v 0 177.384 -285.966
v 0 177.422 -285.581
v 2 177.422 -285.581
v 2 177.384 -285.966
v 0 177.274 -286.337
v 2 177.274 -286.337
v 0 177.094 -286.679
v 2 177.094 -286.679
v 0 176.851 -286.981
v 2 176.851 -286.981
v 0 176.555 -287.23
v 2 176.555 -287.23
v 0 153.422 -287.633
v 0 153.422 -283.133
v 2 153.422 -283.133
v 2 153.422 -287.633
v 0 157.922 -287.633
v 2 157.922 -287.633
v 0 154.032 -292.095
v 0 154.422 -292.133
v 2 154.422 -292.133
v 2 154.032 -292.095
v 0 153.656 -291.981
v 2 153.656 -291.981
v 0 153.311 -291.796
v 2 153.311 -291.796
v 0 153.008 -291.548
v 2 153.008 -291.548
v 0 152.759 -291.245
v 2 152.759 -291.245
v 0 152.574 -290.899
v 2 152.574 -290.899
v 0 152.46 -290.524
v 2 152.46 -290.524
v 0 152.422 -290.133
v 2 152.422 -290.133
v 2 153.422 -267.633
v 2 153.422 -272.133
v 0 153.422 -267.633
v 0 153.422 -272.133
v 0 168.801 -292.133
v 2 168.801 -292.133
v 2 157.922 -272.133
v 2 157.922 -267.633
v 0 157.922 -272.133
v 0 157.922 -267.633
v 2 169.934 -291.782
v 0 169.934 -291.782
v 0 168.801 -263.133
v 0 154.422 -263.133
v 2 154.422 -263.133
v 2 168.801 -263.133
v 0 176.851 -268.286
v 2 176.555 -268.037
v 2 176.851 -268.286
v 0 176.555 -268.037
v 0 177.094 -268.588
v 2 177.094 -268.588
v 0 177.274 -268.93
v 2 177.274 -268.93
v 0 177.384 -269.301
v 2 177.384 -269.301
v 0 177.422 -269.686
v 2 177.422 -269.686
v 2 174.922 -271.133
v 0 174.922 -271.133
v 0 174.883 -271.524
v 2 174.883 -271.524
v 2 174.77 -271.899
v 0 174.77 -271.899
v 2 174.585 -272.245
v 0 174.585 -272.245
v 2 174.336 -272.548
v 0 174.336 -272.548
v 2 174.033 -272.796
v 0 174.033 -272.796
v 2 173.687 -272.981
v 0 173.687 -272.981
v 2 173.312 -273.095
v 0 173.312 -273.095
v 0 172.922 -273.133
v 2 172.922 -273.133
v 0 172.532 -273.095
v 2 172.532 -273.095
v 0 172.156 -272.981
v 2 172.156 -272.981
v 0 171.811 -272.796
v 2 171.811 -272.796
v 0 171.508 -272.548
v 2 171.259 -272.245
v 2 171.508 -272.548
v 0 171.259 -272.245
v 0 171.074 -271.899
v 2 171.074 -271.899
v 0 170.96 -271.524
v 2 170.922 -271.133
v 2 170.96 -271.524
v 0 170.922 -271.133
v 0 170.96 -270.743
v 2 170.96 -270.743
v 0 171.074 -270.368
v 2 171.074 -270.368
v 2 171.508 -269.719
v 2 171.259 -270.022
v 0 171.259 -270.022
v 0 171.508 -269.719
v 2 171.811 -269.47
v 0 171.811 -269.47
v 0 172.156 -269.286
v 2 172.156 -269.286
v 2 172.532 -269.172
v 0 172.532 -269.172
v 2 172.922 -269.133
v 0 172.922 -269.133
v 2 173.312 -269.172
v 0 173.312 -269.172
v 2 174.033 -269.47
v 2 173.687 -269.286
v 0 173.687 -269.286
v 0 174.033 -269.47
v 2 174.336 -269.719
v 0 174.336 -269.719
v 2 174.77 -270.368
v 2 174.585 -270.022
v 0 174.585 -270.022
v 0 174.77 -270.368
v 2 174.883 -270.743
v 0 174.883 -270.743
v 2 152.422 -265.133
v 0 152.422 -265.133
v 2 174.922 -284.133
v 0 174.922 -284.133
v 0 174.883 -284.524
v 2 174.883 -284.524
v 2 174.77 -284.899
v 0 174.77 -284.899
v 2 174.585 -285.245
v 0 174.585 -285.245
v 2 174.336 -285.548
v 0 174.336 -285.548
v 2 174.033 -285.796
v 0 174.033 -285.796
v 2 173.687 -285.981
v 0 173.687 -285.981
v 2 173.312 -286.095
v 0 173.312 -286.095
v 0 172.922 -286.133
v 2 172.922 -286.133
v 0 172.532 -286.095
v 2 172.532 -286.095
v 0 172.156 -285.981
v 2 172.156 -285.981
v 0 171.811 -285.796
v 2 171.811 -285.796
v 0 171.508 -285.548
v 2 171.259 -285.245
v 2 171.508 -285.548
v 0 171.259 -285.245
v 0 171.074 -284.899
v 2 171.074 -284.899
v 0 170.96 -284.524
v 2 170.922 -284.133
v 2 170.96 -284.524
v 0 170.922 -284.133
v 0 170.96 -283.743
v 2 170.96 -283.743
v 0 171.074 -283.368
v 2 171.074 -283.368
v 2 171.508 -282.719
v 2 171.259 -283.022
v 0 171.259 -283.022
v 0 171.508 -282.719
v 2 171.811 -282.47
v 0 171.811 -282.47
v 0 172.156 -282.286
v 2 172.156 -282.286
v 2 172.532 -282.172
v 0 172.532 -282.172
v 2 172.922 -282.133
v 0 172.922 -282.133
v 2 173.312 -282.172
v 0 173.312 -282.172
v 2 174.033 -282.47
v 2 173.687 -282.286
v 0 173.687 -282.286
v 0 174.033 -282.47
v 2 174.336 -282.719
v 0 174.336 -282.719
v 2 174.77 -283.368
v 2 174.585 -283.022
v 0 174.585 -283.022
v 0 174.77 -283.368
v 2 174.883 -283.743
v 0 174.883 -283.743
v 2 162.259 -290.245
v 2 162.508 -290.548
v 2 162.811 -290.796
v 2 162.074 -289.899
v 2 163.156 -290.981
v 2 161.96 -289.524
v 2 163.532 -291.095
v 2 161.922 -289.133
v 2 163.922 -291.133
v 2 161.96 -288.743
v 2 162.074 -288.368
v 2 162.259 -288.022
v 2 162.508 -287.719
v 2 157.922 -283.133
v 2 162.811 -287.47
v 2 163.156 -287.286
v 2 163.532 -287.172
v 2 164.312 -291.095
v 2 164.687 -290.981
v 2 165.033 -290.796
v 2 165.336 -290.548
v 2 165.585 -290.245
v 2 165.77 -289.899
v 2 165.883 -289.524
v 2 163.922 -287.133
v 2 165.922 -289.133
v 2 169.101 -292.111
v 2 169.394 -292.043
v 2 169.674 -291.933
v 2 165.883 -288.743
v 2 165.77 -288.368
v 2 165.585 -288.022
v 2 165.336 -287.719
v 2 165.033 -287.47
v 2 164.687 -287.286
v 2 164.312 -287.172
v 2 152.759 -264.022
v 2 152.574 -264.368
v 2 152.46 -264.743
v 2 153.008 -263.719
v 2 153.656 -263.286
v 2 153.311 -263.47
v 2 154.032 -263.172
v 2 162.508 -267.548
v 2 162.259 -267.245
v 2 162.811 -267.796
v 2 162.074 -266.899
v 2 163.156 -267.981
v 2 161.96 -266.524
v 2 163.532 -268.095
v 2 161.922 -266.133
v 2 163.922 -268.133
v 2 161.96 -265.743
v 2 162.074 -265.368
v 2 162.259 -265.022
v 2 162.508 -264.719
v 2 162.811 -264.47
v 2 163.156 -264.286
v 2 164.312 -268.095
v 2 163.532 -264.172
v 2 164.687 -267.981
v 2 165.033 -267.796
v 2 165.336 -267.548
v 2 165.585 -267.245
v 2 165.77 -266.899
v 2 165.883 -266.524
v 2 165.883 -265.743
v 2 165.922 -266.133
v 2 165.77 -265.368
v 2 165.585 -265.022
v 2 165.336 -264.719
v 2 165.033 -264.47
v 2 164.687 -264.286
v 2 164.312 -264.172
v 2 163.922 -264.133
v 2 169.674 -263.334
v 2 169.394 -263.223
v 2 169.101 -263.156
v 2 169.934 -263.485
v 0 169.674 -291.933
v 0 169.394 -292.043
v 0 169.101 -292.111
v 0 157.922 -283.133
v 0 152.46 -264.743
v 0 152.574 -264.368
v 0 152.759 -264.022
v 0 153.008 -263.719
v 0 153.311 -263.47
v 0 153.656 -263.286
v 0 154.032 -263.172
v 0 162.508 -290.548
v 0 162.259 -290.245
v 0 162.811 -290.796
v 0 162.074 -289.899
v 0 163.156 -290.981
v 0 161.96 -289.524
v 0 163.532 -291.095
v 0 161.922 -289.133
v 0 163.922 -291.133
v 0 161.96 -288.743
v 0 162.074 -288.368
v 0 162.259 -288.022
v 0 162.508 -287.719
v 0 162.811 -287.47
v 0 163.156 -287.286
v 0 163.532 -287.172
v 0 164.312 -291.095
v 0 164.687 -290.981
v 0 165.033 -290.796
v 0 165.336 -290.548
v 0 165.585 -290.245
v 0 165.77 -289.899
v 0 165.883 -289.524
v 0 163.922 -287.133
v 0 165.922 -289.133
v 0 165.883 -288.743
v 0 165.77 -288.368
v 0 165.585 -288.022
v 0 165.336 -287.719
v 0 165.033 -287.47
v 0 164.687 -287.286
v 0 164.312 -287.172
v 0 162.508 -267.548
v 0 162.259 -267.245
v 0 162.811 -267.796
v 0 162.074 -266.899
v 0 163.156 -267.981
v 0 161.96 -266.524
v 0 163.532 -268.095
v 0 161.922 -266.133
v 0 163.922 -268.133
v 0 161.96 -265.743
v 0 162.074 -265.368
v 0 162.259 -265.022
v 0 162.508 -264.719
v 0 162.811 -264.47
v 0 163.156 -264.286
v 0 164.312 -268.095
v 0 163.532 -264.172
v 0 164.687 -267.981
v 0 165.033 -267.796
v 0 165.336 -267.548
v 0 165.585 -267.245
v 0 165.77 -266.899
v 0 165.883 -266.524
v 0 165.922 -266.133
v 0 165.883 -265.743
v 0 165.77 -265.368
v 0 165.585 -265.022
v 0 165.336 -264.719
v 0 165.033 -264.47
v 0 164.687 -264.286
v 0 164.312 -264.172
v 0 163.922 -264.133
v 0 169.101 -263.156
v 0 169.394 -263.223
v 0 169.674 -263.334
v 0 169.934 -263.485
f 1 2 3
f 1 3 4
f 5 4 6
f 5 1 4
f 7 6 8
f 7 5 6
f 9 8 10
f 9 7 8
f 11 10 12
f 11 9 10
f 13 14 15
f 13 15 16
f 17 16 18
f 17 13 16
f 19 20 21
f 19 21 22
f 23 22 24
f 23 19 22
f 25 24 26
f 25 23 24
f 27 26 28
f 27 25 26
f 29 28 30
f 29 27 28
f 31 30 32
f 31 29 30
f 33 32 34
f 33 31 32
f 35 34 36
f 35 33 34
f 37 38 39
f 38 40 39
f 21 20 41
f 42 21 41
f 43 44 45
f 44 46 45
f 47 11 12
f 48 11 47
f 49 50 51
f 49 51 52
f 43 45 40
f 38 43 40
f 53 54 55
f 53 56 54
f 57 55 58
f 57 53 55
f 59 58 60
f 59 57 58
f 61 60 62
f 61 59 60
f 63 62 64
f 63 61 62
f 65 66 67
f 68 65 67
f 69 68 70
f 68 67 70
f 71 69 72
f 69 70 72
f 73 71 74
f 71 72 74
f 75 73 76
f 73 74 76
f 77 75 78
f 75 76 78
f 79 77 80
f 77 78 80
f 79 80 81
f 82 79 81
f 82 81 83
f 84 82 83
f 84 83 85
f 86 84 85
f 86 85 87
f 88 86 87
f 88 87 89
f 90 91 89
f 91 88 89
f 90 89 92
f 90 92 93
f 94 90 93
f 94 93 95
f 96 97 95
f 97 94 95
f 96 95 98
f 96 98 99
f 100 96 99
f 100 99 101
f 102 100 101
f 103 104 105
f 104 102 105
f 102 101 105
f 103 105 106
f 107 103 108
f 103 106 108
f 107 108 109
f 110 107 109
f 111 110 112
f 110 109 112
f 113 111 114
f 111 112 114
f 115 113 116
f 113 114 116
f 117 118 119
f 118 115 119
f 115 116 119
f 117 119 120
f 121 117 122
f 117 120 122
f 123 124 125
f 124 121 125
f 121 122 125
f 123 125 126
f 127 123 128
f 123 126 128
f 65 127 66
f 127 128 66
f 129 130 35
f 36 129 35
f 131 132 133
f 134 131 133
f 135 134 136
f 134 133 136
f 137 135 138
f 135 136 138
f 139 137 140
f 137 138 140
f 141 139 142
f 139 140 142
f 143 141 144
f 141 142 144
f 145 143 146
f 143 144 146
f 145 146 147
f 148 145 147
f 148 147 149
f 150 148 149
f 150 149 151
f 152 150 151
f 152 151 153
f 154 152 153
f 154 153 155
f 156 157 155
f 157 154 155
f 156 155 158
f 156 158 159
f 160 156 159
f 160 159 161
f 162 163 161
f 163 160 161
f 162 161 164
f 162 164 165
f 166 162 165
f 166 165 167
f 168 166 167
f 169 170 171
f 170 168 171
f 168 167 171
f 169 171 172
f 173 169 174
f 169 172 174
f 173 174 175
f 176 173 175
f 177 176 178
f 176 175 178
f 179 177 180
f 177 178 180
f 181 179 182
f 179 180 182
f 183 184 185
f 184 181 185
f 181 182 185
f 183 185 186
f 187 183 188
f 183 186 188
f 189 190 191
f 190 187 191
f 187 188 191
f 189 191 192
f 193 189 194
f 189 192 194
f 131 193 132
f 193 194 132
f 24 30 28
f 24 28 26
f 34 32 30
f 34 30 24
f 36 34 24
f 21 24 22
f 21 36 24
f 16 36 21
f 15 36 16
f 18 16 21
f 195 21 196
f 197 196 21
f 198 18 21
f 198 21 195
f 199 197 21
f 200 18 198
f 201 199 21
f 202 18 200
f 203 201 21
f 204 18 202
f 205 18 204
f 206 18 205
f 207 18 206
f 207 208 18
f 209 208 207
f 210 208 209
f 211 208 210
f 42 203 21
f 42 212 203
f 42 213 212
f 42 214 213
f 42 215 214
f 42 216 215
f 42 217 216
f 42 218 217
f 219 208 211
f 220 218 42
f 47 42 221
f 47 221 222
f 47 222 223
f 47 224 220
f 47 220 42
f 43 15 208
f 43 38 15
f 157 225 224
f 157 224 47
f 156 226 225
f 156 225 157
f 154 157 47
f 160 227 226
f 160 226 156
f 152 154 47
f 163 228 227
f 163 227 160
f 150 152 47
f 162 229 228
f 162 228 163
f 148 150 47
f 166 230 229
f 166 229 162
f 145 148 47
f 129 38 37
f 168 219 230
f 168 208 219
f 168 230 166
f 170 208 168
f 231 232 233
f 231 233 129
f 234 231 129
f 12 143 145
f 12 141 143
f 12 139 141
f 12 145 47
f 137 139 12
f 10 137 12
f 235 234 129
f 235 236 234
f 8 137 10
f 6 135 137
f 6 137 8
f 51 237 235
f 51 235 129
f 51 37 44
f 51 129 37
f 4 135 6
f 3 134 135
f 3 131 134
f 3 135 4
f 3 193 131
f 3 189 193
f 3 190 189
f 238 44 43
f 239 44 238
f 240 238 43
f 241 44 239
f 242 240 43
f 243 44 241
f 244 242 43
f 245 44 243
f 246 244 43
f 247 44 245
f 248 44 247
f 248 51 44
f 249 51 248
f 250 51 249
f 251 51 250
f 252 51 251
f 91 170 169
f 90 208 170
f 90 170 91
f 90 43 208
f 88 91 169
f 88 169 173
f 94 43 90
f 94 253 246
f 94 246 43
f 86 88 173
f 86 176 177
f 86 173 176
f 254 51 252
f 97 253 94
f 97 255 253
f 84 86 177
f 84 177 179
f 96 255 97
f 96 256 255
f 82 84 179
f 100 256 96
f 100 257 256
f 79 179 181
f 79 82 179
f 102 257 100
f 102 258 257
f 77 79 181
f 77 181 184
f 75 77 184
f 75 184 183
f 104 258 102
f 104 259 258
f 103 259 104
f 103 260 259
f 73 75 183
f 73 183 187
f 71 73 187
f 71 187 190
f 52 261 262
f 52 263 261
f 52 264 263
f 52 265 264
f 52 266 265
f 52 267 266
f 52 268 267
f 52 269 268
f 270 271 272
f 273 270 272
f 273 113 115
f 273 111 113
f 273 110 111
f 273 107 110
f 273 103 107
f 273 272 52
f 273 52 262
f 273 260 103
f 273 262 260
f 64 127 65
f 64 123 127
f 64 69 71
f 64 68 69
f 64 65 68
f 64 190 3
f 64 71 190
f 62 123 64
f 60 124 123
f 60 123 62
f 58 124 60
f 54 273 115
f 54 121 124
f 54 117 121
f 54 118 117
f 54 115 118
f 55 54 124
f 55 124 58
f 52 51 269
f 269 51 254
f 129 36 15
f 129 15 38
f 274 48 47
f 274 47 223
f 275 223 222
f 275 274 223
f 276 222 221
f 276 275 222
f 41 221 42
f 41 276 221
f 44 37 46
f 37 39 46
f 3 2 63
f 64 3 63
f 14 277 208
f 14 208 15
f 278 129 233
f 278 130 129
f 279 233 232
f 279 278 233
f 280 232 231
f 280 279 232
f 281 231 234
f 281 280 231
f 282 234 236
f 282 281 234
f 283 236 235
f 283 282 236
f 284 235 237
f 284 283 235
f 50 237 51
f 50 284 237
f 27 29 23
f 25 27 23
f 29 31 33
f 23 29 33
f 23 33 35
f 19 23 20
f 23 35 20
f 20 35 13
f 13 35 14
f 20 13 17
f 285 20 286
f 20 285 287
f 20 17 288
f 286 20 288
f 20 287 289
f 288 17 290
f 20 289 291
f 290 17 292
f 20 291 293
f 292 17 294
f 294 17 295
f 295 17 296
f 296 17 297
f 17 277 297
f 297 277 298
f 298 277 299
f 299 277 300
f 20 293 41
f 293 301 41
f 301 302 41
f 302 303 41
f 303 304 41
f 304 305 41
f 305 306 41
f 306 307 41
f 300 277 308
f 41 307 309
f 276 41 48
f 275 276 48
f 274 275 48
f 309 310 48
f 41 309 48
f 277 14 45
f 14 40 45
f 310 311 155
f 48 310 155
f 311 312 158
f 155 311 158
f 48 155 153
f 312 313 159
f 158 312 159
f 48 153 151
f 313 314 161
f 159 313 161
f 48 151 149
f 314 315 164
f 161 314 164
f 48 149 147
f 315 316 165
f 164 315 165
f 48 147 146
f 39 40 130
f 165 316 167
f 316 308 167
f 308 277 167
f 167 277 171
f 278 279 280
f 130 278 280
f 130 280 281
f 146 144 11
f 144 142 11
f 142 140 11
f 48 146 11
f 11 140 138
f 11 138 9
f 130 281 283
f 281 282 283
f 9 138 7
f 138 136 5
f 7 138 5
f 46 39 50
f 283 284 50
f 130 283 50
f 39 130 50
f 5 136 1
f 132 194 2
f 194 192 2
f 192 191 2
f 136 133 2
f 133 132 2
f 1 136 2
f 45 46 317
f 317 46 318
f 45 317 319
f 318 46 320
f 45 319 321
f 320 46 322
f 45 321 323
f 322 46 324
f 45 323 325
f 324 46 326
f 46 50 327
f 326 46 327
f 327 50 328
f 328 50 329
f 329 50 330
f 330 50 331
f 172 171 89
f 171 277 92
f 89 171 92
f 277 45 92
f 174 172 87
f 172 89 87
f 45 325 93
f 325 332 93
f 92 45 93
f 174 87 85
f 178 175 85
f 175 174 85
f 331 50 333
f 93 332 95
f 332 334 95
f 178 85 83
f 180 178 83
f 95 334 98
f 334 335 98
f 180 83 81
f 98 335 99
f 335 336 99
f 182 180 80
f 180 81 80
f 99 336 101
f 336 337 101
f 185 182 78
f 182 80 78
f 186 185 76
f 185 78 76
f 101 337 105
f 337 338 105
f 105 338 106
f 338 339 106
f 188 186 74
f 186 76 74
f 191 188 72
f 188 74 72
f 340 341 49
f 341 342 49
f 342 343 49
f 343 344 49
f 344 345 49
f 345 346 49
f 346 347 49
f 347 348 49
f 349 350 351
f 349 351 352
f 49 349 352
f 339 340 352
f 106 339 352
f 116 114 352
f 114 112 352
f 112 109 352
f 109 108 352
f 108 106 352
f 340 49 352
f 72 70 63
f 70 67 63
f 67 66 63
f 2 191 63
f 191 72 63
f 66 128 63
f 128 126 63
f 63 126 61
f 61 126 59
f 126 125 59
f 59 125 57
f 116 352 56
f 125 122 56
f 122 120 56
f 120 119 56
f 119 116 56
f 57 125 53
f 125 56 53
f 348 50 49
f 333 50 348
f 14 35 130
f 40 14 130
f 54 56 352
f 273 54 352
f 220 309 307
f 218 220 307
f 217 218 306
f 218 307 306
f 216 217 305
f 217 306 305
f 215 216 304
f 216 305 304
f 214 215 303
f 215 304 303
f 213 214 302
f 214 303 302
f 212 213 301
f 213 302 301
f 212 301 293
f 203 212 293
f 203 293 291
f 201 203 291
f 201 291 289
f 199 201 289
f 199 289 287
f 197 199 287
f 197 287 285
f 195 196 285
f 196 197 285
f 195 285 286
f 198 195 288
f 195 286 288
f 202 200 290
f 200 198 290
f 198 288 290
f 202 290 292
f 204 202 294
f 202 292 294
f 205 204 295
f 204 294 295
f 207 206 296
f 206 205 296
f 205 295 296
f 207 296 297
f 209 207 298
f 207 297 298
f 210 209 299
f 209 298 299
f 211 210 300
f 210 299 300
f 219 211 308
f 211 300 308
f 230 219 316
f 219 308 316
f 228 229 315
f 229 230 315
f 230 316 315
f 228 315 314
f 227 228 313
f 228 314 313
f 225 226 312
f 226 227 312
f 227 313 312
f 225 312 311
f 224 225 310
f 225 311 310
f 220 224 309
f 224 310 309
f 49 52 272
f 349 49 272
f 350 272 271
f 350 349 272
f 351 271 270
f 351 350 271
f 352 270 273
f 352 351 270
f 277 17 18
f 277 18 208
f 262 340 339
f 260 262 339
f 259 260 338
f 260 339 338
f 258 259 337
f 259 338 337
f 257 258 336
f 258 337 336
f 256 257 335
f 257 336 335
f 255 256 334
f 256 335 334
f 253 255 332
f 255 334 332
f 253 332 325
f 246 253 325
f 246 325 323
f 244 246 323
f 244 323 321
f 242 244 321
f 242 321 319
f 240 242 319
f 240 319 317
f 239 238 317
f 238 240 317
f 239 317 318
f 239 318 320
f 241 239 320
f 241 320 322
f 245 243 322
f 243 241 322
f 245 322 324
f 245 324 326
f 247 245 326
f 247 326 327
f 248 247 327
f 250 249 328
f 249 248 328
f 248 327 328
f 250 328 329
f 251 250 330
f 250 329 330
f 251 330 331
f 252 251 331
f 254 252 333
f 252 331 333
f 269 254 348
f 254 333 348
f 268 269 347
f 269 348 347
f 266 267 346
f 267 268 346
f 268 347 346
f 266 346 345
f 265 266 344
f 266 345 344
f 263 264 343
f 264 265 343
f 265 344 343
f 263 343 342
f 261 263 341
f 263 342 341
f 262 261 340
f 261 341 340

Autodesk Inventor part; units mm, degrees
ref_plane "YZ Plane" through (0, 0, 0) normal (1, 0, 0) x (0, 1, 0)
ref_plane "XZ Plane" through (0, 0, 0) normal (0, 1, 0) x (-1, 0, 0)
ref_plane "XY Plane" through (0, 0, 0) normal (0, 0, 1) x (1, 0, 0)
sketch "Эскиз1" plane through (0, 0, 0) normal (1, 0, 0) x (0, 1, 0)
  line L0 (152.4218, -265.1334) -> (152.4218, -277.6334)
  line L1 (152.4218, -277.6334) -> (177.4218, -277.6334)
  line L2 (177.4218, -277.6334) -> (177.4218, -269.6855)
  line L3 (176.5549, -268.0374) -> (169.9337, -263.4853)
  line L4 (154.4218, -263.1334) -> (168.8006, -263.1334)
  line L5 (153.4218, -267.6334) -> (157.9218, -267.6334)
  line L6 (157.9218, -267.6334) -> (157.9218, -272.1334)
  line L7 (157.9218, -272.1334) -> (153.4218, -272.1334)
  line L8 (153.4218, -272.1334) -> (153.4218, -267.6334)
  line L9 (177.4218, -277.6334) -> (177.4218, -269.6855)
  line L10 (176.5549, -268.0374) -> (169.9337, -263.4853)
  circle A0 centre (163.9218, -266.1334) radius 2
  circle A1 centre (172.9218, -271.1334) radius 2
  arc A2 (154.4218, -263.1334) -> (152.4218, -265.1334) centre (154.4218, -265.1334) ccw
  arc A3 (169.9337, -263.4853) -> (168.8006, -263.1334) centre (168.8006, -265.1334) ccw
  arc A4 (177.4218, -269.6855) -> (176.5549, -268.0374) centre (175.4218, -269.6855) ccw
  line L11 (152.4218, -290.1334) -> (152.4218, -277.6334)
  line L12 (177.4218, -277.6334) -> (177.4218, -285.5814)
  line L13 (176.5549, -287.2295) -> (169.9337, -291.7815)
  circle A5 centre (172.9218, -284.1334) radius 2
  circle A6 centre (163.9218, -289.1334) radius 2
  line L14 (157.9218, -287.6334) -> (157.9218, -283.1334)
  line L15 (157.9218, -283.1334) -> (153.4218, -283.1334)
  line L16 (153.4218, -283.1334) -> (153.4218, -287.6334)
  line L17 (154.4218, -292.1334) -> (168.8006, -292.1334)
  line L18 (153.4218, -287.6334) -> (157.9218, -287.6334)
  arc A7 (152.4218, -290.1334) -> (154.4218, -292.1334) centre (154.4218, -290.1334) ccw
  arc A8 (168.8006, -292.1334) -> (169.9337, -291.7815) centre (168.8006, -290.1334) ccw
  arc A9 (176.5549, -287.2295) -> (177.4218, -285.5814) centre (175.4218, -285.5814) ccw
  dimension "d181" = 5.5
  dimension "d182" = 1
  dimension "d183" = 4.5
  dimension "d184" = 4.5
  dimension "d185" = 6
  dimension "d186" = 5
  dimension "d187" = 3
  dimension "d188" = 9
extrude "Выдавливание3" add sketch "Эскиз1" along normal blind 2
properties part number "Практика галактика"
